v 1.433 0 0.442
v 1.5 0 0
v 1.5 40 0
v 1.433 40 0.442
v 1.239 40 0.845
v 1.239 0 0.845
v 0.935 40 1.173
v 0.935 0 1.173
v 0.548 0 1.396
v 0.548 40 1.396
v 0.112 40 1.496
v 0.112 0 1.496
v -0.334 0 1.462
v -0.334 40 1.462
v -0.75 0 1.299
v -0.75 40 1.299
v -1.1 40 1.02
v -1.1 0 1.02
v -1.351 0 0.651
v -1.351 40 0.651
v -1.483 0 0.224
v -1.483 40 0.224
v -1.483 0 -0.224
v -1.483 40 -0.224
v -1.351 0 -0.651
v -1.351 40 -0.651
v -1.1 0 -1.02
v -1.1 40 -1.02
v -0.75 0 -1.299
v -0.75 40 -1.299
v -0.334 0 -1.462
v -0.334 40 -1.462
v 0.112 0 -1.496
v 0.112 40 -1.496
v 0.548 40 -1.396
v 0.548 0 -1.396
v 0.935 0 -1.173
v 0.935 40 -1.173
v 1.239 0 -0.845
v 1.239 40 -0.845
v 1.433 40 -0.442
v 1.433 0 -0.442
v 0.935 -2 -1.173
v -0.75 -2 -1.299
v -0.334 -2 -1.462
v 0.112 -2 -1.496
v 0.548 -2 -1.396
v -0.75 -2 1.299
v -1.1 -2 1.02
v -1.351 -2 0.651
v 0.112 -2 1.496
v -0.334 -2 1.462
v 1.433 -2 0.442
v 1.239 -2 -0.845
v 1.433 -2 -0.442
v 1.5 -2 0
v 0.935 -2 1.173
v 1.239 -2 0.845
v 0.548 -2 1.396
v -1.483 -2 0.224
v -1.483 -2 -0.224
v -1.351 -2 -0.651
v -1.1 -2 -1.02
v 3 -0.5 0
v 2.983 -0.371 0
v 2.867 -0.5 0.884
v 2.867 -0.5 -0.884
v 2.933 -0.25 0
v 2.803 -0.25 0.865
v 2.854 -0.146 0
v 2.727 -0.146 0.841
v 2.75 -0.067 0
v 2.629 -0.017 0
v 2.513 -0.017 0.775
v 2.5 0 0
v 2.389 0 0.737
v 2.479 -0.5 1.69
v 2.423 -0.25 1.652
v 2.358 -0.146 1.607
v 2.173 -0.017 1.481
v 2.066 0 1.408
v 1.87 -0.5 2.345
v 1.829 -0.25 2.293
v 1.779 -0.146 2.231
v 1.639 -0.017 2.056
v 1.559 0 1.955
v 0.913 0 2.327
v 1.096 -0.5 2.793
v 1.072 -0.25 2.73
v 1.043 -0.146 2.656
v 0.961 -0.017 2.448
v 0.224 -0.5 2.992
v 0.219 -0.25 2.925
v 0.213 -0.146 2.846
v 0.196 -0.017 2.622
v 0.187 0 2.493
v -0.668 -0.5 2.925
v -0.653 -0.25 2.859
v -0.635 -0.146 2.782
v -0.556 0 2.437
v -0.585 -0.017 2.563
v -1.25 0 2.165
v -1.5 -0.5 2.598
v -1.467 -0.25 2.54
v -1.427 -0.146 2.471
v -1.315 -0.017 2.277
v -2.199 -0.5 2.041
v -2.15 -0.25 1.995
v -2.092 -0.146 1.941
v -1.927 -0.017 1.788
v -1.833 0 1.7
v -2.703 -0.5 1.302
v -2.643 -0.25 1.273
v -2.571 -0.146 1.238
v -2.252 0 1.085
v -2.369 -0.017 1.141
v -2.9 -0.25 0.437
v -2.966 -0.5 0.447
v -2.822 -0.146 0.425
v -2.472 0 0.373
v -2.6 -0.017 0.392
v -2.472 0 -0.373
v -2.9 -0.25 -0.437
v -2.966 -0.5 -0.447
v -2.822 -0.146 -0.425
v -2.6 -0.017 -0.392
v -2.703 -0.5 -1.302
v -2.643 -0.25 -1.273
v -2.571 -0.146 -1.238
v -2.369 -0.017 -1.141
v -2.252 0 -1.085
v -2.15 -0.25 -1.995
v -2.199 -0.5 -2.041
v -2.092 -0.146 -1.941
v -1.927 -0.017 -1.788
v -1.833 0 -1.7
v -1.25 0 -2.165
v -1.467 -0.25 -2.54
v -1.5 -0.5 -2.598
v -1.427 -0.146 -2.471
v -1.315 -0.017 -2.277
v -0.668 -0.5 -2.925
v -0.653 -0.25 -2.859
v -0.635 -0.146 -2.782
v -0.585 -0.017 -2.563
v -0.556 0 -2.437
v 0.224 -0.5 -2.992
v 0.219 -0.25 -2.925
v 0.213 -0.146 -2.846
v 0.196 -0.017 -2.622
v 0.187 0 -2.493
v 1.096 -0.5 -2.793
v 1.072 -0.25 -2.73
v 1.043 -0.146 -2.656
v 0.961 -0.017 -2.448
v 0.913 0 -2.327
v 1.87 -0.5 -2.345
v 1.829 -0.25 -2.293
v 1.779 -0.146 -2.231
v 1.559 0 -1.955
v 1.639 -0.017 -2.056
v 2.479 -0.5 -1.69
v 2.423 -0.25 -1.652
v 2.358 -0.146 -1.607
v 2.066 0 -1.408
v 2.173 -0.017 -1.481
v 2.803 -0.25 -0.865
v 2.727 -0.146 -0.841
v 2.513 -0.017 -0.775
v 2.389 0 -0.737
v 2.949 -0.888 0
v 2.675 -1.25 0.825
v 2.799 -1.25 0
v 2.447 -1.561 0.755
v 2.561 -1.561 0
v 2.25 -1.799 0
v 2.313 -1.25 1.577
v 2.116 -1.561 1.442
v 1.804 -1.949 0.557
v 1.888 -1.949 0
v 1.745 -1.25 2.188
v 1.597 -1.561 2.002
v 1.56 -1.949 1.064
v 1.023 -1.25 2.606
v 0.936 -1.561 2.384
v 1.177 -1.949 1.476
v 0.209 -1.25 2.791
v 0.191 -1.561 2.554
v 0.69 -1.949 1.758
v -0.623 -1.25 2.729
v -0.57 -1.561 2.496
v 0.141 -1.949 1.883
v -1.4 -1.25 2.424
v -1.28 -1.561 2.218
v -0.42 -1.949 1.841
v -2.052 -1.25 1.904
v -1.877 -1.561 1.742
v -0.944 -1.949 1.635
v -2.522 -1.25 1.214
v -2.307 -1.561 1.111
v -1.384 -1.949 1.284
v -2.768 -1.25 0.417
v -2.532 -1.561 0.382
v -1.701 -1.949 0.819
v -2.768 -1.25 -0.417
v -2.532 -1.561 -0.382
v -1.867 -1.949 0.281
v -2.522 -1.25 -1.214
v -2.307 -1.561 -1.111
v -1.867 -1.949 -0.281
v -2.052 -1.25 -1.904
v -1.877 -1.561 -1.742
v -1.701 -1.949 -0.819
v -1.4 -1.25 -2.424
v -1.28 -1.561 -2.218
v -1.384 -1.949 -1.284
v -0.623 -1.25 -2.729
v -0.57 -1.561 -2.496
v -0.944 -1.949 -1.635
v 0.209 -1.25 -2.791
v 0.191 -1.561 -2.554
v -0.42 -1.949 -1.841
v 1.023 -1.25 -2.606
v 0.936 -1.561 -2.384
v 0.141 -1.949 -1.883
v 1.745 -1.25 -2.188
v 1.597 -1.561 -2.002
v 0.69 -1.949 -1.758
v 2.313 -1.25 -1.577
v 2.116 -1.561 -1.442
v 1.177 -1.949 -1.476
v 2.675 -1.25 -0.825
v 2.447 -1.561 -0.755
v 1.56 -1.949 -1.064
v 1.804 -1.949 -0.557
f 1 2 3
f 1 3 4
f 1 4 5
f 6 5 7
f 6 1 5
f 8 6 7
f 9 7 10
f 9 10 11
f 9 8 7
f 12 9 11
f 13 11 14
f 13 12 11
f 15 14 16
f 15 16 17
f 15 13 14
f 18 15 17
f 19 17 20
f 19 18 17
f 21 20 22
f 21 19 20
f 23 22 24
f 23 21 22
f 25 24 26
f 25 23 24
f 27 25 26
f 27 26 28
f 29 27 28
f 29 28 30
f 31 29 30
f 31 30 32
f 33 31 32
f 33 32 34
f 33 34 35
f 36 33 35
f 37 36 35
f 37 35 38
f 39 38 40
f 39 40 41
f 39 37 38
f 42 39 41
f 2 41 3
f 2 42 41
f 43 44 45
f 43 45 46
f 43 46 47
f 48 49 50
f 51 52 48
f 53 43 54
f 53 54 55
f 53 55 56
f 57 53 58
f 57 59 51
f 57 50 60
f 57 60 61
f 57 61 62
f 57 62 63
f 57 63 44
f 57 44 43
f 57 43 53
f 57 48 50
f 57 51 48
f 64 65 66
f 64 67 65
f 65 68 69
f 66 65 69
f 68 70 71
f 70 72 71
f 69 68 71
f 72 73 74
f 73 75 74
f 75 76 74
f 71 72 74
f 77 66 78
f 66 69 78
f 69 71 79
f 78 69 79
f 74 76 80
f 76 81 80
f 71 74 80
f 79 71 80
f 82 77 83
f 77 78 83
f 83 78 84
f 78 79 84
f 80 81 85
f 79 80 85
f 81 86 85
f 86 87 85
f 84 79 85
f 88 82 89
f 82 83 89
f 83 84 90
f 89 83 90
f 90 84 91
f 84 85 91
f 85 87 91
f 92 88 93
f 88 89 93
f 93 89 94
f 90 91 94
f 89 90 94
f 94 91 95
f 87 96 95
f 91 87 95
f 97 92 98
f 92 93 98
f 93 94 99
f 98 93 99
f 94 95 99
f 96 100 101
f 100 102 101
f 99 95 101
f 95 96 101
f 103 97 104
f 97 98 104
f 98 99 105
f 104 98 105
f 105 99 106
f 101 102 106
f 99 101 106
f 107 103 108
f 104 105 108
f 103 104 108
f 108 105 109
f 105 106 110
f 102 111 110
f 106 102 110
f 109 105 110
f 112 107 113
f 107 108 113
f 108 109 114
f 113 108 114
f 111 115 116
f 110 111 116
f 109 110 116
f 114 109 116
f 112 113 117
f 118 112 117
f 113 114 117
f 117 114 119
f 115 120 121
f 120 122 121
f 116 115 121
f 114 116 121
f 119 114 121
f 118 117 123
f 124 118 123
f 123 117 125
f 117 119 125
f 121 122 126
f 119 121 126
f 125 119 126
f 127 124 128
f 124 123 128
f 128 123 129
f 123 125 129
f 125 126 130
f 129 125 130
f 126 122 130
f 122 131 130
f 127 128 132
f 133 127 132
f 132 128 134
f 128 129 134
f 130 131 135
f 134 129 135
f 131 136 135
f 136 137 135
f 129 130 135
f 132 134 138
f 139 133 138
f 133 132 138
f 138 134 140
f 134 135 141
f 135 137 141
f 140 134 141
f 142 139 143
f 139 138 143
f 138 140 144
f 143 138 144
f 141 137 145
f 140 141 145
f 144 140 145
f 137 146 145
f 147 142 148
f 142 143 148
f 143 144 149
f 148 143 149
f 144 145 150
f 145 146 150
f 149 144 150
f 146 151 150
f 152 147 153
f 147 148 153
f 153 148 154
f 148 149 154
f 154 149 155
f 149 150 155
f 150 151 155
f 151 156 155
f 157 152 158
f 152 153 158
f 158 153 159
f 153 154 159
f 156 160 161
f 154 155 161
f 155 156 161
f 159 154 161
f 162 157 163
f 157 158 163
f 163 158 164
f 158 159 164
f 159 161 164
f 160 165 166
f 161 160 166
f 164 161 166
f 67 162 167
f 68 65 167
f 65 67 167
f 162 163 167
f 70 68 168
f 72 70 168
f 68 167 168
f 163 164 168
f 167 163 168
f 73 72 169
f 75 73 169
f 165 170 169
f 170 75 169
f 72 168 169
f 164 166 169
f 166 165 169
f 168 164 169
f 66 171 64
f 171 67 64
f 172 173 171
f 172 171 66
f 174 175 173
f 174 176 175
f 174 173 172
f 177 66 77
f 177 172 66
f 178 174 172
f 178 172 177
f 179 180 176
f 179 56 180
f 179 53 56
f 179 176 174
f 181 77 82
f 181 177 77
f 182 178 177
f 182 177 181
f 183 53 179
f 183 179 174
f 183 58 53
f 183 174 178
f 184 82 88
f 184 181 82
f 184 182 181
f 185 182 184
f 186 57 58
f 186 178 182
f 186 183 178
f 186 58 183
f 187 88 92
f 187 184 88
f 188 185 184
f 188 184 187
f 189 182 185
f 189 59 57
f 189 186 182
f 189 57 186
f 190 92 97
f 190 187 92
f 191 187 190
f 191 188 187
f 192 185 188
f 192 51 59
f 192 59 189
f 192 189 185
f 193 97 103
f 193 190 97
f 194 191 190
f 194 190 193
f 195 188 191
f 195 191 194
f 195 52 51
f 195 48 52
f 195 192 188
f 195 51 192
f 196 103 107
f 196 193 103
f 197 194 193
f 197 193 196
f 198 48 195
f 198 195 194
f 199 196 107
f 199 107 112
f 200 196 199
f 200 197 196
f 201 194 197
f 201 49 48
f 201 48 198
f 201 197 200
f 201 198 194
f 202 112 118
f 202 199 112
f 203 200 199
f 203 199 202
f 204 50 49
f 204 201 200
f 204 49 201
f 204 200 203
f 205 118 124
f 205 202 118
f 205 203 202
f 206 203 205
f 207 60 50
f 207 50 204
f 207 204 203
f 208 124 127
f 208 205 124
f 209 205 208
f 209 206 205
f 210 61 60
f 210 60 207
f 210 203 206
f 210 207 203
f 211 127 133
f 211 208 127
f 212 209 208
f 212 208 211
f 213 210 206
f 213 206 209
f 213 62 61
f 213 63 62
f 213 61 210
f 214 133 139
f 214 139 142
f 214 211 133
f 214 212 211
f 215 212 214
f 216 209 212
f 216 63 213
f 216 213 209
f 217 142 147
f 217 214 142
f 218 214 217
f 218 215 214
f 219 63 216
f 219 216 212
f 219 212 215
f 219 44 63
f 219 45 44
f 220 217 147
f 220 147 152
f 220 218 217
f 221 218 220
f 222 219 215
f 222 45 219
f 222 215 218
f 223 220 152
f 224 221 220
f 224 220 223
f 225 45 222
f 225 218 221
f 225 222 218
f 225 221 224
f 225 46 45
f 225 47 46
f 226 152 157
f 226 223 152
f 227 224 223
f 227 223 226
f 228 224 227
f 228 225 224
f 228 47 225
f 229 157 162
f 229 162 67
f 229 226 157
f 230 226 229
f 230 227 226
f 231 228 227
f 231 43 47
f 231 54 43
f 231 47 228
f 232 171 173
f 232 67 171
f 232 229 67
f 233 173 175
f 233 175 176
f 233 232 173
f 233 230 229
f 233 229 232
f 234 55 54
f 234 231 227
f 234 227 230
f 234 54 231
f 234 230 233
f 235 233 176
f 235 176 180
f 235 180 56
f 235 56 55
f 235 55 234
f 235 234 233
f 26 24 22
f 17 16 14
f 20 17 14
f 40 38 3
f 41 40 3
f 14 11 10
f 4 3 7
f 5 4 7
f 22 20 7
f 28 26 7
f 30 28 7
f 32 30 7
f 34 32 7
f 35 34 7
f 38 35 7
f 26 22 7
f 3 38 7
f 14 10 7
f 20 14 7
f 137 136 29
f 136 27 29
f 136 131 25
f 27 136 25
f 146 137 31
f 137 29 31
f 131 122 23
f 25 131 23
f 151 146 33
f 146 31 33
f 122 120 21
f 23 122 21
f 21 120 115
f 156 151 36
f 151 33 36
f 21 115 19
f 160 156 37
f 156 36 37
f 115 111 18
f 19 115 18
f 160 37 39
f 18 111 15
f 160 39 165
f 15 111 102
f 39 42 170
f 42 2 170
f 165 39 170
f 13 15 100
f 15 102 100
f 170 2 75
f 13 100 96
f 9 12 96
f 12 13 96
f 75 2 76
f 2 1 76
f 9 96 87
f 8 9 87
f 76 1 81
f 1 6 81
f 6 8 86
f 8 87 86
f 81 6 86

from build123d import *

# Parameters (mm, degrees)
F0_R     = 1.5
F1_DEPTH = 40
F2_R     = 3
F3_DEPTH = 2
F4_R     = 1.5
F5_R     = 0.49999


# Not quite as in the source:
# - a fillet or chamfer is up to 0.001 mm smaller than in the source, because OpenCascade refuses the exact size


with BuildPart() as f1:
    # F0 (on Front) → F1 (new body)
    with BuildSketch(Plane.XZ):
        Circle(F0_R)
    extrude(amount=-F1_DEPTH)

    # F2 (on face) → F3 (join)
    with BuildSketch(Plane.XZ):
        Circle(F2_R)
    extrude(amount=F3_DEPTH)

    # F4
    f4_edges = [f1.edges().sort_by_distance(p)[0] for p in [
        (-3, -2, 0),
    ]]
    fillet(f4_edges, radius=F4_R)

    # F5 (radius 0.5 in the source; OpenCascade refuses exactly that, so slightly less here)
    f5_edges = [f1.edges().sort_by_distance(p)[0] for p in [
        (-3, 0, 0),
    ]]
    fillet(f5_edges, radius=F5_R)


solid = f1.part
